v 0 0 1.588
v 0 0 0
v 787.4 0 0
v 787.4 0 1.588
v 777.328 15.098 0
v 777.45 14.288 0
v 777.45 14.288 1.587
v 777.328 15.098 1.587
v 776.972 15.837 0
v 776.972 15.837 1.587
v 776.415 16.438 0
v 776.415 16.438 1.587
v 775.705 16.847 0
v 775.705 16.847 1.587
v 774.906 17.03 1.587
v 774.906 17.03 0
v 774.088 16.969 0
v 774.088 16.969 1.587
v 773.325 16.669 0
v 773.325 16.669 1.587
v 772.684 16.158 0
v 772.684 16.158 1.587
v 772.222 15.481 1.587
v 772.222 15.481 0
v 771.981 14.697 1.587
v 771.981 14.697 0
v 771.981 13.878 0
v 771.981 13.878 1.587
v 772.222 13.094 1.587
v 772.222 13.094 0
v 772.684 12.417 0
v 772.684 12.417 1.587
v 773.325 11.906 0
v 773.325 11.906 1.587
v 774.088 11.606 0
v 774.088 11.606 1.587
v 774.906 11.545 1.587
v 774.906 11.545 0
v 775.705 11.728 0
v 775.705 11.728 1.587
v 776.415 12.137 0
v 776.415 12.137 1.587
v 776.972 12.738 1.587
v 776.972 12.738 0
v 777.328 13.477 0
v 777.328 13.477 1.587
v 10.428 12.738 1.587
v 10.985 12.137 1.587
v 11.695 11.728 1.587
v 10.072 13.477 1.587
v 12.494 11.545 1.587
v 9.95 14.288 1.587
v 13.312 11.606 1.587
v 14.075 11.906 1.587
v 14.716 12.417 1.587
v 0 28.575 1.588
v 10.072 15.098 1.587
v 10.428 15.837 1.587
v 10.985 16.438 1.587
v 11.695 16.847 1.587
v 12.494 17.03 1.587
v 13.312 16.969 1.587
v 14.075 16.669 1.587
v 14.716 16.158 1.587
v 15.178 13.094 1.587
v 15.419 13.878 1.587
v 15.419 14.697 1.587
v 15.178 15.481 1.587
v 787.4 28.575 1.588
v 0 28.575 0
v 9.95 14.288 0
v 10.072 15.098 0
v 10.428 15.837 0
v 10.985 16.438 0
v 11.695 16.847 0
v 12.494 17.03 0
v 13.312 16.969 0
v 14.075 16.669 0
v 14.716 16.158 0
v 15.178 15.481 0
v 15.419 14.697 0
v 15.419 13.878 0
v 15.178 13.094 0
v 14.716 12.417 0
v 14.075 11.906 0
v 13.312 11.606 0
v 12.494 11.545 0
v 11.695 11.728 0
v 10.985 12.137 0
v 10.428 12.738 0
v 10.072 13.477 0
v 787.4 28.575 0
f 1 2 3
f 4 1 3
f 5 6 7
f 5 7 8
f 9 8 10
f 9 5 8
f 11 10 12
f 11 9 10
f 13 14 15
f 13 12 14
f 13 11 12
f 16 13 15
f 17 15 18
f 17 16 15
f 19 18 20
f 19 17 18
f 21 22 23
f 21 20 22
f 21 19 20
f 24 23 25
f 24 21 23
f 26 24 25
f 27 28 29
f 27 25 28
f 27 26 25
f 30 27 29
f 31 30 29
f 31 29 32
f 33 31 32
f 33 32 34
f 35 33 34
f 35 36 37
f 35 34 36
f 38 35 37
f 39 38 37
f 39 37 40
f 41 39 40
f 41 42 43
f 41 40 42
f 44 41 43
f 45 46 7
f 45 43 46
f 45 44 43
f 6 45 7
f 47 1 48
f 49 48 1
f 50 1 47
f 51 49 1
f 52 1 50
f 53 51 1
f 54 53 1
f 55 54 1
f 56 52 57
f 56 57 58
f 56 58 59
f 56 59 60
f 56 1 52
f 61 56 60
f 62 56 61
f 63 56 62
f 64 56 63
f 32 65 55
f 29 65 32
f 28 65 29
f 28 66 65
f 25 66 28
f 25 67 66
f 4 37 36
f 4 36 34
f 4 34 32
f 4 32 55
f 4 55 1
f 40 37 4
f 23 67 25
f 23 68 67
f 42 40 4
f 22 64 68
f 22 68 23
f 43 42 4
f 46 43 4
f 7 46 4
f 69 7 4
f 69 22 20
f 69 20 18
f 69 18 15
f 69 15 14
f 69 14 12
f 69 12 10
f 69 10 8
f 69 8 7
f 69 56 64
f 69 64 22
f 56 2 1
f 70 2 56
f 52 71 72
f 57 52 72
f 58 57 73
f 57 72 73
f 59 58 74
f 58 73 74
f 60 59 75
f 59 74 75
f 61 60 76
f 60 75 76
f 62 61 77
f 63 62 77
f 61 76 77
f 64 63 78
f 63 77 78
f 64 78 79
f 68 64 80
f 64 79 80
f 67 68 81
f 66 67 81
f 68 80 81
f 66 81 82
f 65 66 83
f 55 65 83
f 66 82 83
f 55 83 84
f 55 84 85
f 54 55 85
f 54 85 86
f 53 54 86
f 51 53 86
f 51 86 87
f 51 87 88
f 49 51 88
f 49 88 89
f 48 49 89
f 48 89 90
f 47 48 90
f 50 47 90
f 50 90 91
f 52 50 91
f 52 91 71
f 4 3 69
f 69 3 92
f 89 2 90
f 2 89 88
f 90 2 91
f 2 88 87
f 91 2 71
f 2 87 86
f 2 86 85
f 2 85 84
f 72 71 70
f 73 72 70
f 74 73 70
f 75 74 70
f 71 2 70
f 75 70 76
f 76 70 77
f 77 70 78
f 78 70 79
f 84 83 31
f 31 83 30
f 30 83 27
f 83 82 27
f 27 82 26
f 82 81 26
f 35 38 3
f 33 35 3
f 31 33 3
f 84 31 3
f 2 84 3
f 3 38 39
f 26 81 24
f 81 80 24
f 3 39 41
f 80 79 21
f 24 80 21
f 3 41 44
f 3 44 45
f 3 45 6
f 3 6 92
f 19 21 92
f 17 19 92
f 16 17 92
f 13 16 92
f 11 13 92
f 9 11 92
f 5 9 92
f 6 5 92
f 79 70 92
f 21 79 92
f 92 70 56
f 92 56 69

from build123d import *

# Parameters (mm, degrees)
SKETCH1_W            = 787.4
SKETCH1_H            = 28.575
BOSS_EXTRUDE1_DEPTH  = 1.5875
M5_CLEARANCE_HOLE1_D = 5.5


with BuildPart() as part:
    # Sketch1 → Boss-Extrude1 (new body)
    with BuildSketch(Plane.XY):
        with Locations((393.7, 14.2875)):
            Rectangle(SKETCH1_W, SKETCH1_H)
    extrude(amount=BOSS_EXTRUDE1_DEPTH)

    # M5 Clearance Hole1 (through all)
    with Locations(Plane.XY.offset(1.5875)):
        with Locations((12.7, 14.2875)):
            m5_clearance_hole1 = Hole(M5_CLEARANCE_HOLE1_D / 2)

    # Mirror1: M5 Clearance Hole1 across plane
    add(m5_clearance_hole1.mirror(Plane(origin=(393.7, 0, 0), x_dir=(0, 0, 1), z_dir=(1, 0, 0))), mode=Mode.SUBTRACT)


solid = part.part
